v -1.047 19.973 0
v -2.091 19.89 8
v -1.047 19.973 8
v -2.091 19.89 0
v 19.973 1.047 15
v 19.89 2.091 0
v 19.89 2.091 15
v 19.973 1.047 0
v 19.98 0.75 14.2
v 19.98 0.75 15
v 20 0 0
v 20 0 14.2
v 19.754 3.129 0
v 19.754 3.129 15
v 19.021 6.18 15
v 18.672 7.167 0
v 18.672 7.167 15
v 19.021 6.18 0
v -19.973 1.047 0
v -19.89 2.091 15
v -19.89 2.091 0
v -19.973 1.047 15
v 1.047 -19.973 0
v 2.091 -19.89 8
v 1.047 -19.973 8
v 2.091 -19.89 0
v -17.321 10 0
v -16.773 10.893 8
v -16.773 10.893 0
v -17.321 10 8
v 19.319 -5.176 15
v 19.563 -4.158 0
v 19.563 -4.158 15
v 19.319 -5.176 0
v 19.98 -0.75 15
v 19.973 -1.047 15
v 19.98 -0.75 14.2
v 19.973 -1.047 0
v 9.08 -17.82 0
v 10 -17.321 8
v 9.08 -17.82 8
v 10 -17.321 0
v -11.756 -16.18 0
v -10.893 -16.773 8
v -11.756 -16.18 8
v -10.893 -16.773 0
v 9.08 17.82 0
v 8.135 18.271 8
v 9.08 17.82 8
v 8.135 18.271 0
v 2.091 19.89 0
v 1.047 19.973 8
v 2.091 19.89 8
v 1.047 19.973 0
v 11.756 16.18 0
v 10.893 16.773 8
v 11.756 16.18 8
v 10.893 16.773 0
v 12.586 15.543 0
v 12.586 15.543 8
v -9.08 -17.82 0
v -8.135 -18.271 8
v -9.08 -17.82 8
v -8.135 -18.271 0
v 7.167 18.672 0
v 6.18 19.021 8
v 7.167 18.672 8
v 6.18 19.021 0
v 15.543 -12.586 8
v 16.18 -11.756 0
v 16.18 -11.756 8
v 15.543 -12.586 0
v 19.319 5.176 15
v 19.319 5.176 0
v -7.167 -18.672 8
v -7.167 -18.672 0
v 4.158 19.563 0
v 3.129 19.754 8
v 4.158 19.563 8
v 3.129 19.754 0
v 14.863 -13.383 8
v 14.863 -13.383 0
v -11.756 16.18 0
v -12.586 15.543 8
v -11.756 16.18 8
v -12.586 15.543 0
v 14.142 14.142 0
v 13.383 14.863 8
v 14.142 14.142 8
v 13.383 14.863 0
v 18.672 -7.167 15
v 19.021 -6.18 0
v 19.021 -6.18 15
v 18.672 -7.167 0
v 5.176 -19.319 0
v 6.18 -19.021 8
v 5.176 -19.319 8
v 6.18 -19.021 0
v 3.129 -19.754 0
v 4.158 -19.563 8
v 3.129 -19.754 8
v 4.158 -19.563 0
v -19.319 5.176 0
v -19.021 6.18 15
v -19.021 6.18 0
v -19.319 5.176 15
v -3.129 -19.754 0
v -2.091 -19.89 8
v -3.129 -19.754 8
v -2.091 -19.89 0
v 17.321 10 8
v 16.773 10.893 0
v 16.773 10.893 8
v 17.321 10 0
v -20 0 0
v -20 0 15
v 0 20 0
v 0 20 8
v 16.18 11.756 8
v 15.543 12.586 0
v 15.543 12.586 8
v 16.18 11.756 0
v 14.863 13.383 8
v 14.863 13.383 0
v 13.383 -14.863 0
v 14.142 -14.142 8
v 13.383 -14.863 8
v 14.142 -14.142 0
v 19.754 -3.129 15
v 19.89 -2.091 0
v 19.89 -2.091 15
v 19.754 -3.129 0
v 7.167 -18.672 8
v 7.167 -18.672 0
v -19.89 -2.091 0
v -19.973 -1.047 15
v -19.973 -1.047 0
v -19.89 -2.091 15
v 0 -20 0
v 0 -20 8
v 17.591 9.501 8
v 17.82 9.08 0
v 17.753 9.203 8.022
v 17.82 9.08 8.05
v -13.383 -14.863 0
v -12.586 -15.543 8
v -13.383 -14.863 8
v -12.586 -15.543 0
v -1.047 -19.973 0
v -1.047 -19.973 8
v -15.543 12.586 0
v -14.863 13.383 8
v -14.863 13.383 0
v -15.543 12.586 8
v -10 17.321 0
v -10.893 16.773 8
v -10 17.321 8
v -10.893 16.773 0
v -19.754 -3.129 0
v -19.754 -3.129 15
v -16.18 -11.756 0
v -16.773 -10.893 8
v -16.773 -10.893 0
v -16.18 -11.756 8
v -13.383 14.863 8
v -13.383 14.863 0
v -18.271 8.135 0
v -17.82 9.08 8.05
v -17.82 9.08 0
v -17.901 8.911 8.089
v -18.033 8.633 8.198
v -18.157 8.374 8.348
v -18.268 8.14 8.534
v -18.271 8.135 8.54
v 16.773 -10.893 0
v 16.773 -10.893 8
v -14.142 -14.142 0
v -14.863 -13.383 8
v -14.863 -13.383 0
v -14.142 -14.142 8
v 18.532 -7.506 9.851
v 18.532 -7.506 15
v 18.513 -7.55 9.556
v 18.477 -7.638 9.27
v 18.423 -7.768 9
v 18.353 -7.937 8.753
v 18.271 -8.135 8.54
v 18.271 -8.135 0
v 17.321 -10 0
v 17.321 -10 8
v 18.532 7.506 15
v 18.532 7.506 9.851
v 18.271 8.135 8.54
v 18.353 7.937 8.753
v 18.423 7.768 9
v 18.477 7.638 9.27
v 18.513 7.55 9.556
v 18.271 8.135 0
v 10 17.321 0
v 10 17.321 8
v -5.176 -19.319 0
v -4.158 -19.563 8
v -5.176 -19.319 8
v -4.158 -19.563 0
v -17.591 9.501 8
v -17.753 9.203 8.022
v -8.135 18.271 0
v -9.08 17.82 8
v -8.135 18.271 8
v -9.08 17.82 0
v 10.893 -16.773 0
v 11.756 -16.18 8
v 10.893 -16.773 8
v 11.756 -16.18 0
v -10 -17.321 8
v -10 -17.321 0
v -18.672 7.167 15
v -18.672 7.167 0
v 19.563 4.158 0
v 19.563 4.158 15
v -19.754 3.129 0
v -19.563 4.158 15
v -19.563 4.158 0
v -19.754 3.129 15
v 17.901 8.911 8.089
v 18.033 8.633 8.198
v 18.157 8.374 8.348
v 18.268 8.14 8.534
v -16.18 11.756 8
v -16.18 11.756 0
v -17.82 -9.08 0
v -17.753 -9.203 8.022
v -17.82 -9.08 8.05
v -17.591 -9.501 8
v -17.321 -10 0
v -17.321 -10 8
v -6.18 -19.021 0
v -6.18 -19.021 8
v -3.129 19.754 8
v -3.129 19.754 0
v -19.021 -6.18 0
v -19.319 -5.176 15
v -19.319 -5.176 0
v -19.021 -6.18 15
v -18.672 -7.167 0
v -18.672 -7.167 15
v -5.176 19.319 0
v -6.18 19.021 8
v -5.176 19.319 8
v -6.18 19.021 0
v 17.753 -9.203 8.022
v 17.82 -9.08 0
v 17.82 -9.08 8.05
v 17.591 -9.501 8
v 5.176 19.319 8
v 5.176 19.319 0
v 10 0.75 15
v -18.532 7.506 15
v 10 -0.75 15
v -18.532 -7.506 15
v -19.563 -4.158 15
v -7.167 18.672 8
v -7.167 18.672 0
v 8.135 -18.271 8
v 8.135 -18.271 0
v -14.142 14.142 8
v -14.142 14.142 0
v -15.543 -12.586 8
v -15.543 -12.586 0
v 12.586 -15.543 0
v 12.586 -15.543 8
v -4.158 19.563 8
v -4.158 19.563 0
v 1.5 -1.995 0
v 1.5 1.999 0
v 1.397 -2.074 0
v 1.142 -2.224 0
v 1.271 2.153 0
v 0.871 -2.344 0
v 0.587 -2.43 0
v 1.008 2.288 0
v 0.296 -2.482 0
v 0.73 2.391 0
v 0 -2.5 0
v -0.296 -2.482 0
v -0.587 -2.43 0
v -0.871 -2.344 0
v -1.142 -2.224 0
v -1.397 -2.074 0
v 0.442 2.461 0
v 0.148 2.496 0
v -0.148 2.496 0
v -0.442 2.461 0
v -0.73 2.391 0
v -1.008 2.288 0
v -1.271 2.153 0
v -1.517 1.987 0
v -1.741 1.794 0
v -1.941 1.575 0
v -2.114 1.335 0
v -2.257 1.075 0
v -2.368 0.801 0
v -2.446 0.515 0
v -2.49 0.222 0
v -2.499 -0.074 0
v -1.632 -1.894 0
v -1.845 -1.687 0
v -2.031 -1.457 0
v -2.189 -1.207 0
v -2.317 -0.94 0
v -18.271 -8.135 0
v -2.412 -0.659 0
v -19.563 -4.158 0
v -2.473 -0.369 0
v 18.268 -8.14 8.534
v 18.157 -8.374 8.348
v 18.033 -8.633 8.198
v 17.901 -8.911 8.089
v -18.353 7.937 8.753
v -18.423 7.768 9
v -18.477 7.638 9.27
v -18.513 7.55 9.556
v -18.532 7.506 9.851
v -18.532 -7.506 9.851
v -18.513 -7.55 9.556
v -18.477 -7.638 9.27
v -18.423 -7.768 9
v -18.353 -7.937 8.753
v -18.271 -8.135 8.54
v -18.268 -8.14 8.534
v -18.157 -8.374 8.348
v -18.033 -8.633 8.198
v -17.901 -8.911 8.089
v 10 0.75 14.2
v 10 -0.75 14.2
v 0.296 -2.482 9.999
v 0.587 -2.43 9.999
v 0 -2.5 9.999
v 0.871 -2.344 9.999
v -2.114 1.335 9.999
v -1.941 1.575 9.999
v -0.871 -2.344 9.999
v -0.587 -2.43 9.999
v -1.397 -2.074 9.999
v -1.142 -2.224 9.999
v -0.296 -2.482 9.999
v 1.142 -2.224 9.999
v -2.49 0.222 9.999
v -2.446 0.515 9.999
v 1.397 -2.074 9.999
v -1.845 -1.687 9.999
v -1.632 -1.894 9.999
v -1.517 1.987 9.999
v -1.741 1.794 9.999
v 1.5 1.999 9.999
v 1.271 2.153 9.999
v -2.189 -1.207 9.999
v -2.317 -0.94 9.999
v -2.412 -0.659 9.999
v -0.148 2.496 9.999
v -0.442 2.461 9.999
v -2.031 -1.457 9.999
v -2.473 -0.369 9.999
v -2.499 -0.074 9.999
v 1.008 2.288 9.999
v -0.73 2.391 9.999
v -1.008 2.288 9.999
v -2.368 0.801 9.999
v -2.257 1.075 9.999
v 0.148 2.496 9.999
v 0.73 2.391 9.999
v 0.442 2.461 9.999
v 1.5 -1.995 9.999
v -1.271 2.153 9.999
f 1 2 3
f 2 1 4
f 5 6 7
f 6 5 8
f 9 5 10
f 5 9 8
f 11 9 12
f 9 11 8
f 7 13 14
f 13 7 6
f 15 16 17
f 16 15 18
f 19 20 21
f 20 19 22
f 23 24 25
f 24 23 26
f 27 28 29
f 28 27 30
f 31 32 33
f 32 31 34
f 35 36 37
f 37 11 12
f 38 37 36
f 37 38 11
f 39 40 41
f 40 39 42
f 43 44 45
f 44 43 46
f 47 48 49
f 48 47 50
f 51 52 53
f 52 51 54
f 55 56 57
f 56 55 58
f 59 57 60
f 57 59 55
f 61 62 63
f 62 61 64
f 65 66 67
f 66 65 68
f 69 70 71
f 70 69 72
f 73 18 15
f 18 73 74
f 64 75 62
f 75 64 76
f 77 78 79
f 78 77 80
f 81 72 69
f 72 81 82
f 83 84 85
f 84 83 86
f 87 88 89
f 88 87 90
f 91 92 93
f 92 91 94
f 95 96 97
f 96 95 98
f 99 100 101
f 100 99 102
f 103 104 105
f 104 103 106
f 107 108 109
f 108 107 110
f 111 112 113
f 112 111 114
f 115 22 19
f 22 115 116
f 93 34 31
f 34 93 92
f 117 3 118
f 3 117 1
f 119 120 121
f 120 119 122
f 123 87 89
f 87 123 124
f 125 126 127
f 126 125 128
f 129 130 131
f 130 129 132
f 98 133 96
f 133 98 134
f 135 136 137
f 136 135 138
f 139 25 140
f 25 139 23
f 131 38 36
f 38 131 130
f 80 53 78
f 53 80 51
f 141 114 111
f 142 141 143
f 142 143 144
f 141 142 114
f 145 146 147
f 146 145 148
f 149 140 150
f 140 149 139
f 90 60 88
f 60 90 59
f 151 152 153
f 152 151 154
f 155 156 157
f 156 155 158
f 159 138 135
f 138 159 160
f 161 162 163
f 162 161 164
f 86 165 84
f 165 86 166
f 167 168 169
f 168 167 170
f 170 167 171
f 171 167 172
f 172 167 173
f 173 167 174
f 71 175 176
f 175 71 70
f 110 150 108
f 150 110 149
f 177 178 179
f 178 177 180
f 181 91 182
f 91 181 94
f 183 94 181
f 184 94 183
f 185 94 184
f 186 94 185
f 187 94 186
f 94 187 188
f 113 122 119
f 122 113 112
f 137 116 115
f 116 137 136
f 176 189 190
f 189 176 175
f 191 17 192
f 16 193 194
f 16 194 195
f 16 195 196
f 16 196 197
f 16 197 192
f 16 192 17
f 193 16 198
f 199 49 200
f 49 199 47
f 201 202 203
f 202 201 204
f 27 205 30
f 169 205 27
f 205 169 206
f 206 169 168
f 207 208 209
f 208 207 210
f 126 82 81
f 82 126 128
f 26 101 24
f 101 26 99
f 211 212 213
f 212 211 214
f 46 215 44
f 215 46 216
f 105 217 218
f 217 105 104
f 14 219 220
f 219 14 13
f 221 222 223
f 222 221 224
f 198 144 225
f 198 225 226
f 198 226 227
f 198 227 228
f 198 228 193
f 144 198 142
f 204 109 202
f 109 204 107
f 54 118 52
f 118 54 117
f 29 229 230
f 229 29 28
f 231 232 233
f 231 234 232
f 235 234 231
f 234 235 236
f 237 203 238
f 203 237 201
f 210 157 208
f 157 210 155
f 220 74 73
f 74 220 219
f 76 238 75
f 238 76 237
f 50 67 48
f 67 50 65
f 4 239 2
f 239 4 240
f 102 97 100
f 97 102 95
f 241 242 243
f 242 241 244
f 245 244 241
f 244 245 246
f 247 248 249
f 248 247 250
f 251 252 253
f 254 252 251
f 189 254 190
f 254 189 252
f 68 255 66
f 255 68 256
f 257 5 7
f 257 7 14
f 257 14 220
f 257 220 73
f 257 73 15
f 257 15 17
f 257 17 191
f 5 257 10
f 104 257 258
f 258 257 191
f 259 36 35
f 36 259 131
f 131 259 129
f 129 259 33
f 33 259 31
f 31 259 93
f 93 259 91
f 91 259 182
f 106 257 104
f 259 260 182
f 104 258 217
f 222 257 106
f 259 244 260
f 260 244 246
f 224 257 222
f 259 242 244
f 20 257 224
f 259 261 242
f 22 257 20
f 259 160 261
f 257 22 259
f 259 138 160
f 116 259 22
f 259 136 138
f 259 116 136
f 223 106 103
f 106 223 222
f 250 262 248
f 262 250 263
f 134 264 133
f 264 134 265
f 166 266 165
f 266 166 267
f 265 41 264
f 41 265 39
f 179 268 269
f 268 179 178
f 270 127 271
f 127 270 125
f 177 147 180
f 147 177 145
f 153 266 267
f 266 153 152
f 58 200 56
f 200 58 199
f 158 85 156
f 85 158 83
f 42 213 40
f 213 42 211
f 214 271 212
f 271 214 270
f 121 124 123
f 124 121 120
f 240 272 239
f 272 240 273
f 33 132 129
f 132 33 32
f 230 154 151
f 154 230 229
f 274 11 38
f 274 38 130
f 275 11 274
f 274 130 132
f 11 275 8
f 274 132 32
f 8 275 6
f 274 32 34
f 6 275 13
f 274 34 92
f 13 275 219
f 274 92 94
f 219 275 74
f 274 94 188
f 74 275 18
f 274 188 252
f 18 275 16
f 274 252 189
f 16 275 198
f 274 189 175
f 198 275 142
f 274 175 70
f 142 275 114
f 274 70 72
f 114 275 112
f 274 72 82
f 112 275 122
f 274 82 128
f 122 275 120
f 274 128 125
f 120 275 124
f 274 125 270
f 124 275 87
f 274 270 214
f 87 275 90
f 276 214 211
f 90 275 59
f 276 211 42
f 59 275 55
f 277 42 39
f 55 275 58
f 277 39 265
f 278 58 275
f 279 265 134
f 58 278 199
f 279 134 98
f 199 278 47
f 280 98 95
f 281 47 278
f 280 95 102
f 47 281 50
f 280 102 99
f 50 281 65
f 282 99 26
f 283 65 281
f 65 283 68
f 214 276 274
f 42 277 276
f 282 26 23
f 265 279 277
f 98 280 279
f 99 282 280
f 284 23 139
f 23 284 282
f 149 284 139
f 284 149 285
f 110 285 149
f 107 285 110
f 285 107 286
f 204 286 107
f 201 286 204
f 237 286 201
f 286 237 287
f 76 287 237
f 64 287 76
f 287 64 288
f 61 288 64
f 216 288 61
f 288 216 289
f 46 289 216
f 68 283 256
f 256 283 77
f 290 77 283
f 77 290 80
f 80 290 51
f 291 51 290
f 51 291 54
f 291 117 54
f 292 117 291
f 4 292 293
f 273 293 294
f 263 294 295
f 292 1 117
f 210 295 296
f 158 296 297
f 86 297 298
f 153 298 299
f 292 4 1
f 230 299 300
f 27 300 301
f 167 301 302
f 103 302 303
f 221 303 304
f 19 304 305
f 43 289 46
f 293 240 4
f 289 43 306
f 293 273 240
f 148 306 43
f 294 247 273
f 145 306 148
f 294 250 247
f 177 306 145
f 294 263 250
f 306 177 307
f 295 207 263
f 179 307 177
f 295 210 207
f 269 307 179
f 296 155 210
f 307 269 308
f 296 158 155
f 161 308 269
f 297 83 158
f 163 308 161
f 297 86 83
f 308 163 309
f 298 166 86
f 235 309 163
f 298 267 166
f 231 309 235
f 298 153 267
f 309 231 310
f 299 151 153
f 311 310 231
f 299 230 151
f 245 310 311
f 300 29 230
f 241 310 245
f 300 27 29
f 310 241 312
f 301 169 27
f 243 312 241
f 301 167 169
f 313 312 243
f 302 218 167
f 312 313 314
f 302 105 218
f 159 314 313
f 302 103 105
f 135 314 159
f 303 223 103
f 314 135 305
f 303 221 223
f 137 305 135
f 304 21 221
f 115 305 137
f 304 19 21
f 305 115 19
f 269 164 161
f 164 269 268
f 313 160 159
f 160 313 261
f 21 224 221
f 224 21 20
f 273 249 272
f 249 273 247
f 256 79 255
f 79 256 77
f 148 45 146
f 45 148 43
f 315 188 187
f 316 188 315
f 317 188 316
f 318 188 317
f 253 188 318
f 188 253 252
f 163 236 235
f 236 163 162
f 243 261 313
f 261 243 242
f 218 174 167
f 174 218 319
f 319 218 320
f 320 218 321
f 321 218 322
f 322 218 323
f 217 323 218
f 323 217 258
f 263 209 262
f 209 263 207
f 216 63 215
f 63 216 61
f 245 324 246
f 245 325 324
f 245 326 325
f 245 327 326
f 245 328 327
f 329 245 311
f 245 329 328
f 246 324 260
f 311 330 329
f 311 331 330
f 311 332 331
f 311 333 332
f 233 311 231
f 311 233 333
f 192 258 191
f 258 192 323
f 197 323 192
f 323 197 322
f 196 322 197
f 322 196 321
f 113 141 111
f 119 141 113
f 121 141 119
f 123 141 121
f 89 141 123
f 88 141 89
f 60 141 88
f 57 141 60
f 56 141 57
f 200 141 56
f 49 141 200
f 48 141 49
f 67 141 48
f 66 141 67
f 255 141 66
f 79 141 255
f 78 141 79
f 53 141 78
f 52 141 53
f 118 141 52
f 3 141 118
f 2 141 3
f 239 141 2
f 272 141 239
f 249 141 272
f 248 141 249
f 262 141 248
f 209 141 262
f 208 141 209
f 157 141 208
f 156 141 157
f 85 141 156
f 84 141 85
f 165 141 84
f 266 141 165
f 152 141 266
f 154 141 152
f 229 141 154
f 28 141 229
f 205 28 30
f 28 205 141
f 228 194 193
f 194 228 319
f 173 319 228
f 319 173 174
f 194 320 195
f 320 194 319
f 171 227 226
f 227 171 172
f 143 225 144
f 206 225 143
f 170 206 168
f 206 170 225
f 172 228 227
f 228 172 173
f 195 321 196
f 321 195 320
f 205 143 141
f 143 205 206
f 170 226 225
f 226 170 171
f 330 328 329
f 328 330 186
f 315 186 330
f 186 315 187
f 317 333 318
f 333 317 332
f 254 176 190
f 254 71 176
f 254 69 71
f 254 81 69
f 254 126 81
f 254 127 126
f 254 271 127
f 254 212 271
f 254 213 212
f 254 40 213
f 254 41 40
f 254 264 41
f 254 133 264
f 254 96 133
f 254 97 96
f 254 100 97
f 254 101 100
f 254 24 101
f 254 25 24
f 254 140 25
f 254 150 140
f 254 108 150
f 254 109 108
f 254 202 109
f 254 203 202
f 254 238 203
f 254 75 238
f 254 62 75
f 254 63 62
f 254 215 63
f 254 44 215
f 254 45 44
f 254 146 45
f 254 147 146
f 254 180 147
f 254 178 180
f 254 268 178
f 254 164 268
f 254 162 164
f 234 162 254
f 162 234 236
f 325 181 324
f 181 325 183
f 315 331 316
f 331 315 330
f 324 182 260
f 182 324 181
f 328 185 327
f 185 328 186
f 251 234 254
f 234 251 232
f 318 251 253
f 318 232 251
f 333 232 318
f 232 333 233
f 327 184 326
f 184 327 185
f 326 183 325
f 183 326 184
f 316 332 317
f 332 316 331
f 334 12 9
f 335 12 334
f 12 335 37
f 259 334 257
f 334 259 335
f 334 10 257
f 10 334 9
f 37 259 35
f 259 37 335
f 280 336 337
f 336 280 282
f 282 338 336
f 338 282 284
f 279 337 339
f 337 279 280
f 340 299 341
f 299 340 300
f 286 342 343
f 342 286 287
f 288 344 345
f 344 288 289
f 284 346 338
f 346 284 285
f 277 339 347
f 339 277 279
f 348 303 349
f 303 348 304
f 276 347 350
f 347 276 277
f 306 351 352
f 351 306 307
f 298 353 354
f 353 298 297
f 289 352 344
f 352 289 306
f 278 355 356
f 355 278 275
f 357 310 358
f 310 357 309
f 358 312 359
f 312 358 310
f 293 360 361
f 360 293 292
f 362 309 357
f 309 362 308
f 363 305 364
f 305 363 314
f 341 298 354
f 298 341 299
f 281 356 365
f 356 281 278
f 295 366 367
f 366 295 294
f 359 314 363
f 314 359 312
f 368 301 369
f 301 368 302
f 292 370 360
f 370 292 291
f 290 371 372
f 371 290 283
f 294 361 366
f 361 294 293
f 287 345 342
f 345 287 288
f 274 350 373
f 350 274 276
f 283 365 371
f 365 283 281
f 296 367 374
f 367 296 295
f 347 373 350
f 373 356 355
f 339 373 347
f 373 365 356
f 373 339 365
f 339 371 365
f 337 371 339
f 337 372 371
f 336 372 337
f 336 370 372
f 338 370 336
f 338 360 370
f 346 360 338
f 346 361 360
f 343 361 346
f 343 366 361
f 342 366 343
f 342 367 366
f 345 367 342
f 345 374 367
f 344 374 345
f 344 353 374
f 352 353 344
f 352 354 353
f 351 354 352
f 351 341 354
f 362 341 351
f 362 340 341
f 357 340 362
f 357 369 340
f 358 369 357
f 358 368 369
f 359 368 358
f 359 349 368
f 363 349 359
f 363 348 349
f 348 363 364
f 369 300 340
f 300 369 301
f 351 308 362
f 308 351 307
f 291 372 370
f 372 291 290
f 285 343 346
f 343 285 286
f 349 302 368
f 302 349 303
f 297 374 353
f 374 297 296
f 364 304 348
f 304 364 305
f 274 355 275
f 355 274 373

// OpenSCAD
// https://makerworld.com/en/models/1142338-d-shaft-knob-generator

/* [Knob] */
Diameter=40;
Full_height=15;
Head_height=7;
Head_width=15;
Head_fillet=2;
/* [Marker line] */
Line_width=1.5;
Line_height=10;
Line_depth=0.8;
/* [Shaft] */
// Shaft Diameter ⌀
Shaft_Diameter = 5.0;
// Diameter (across cut) >D<
D_Shaft_Diameter = 4.0;
Shaft_depth=10;
Shaft_rotation=0; //[0:90:270]
/* [Bottom] */

Bottom_type="Full"; // [Full, Inner, Outer]
Inner_diameter=15;
Wall_width=3;
Wall=Diameter-Wall_width;
Outher_Length = 10;
Outer_diameter = 13;
/* [Hidden] */
$fs=.3;
/* [Hidden] */
$fa=3;
Fillet_radius=Head_fillet+0.001;

module Knob(){
    difference(){
    cylinder(h=Full_height, d=Diameter);

        translate([-Diameter/2,Fillet_radius+Head_width/2,Diameter+Fillet_radius+Full_height-Head_height])
       rotate([0,90,0])minkowski()
            {
              cube([Diameter,Diameter,1]);
              cylinder(r=Fillet_radius,h=Diameter);
            }

        translate([-Diameter/2,-Fillet_radius-Head_width/2-Diameter,Diameter+Fillet_radius+Full_height-Head_height])
       rotate([0,90,0])minkowski()
            {
              cube([Diameter,Diameter,1]);
              cylinder(r=Fillet_radius,h=Diameter);
            }
            translate([Diameter/2,0,Full_height])
    cube([Line_height*2,Line_width,Line_depth*2], center=true);
    if (Bottom_type=="Inner") Hollow();
    }
}
module Hollow(){
    translate([0, 0, -0.001])difference() {
    if (Wall_width<=1) 
        cylinder(h = Full_height-Head_height-1, d = Diameter-1);
    else
        cylinder(h = Full_height-Head_height-Wall_width, d = Wall);
        
    translate([0, 0, 0])
        if (Inner_diameter<=Shaft_Diameter) 
            cylinder(h = Full_height, d = Shaft_Diameter+1);
        else
            cylinder(h = Full_height, d = Inner_diameter);
    }
}

module Shaft(){
        translate([0, 0, -0.001])rotate([0,0,270])difference(){
        cylinder(h=Shaft_depth, d=Shaft_Diameter);
        translate([0,D_Shaft_Diameter,(Shaft_depth/2)])
        cube([Shaft_Diameter,Shaft_Diameter,Shaft_depth], center=true);
    }
}
if (Bottom_type=="Outer"){
  difference(){
  union(){
    Knob();
    translate([0,0,0-Outher_Length])cylinder(h = Outher_Length, d = Outer_diameter);
    }
  rotate([0,0,Shaft_rotation])translate([0,0,0-Outher_Length])Shaft();
  }
}

if (Bottom_type!="Outer"){
    difference(){
        Knob();
        rotate([0,0,Shaft_rotation])
        Shaft();
    }
}
